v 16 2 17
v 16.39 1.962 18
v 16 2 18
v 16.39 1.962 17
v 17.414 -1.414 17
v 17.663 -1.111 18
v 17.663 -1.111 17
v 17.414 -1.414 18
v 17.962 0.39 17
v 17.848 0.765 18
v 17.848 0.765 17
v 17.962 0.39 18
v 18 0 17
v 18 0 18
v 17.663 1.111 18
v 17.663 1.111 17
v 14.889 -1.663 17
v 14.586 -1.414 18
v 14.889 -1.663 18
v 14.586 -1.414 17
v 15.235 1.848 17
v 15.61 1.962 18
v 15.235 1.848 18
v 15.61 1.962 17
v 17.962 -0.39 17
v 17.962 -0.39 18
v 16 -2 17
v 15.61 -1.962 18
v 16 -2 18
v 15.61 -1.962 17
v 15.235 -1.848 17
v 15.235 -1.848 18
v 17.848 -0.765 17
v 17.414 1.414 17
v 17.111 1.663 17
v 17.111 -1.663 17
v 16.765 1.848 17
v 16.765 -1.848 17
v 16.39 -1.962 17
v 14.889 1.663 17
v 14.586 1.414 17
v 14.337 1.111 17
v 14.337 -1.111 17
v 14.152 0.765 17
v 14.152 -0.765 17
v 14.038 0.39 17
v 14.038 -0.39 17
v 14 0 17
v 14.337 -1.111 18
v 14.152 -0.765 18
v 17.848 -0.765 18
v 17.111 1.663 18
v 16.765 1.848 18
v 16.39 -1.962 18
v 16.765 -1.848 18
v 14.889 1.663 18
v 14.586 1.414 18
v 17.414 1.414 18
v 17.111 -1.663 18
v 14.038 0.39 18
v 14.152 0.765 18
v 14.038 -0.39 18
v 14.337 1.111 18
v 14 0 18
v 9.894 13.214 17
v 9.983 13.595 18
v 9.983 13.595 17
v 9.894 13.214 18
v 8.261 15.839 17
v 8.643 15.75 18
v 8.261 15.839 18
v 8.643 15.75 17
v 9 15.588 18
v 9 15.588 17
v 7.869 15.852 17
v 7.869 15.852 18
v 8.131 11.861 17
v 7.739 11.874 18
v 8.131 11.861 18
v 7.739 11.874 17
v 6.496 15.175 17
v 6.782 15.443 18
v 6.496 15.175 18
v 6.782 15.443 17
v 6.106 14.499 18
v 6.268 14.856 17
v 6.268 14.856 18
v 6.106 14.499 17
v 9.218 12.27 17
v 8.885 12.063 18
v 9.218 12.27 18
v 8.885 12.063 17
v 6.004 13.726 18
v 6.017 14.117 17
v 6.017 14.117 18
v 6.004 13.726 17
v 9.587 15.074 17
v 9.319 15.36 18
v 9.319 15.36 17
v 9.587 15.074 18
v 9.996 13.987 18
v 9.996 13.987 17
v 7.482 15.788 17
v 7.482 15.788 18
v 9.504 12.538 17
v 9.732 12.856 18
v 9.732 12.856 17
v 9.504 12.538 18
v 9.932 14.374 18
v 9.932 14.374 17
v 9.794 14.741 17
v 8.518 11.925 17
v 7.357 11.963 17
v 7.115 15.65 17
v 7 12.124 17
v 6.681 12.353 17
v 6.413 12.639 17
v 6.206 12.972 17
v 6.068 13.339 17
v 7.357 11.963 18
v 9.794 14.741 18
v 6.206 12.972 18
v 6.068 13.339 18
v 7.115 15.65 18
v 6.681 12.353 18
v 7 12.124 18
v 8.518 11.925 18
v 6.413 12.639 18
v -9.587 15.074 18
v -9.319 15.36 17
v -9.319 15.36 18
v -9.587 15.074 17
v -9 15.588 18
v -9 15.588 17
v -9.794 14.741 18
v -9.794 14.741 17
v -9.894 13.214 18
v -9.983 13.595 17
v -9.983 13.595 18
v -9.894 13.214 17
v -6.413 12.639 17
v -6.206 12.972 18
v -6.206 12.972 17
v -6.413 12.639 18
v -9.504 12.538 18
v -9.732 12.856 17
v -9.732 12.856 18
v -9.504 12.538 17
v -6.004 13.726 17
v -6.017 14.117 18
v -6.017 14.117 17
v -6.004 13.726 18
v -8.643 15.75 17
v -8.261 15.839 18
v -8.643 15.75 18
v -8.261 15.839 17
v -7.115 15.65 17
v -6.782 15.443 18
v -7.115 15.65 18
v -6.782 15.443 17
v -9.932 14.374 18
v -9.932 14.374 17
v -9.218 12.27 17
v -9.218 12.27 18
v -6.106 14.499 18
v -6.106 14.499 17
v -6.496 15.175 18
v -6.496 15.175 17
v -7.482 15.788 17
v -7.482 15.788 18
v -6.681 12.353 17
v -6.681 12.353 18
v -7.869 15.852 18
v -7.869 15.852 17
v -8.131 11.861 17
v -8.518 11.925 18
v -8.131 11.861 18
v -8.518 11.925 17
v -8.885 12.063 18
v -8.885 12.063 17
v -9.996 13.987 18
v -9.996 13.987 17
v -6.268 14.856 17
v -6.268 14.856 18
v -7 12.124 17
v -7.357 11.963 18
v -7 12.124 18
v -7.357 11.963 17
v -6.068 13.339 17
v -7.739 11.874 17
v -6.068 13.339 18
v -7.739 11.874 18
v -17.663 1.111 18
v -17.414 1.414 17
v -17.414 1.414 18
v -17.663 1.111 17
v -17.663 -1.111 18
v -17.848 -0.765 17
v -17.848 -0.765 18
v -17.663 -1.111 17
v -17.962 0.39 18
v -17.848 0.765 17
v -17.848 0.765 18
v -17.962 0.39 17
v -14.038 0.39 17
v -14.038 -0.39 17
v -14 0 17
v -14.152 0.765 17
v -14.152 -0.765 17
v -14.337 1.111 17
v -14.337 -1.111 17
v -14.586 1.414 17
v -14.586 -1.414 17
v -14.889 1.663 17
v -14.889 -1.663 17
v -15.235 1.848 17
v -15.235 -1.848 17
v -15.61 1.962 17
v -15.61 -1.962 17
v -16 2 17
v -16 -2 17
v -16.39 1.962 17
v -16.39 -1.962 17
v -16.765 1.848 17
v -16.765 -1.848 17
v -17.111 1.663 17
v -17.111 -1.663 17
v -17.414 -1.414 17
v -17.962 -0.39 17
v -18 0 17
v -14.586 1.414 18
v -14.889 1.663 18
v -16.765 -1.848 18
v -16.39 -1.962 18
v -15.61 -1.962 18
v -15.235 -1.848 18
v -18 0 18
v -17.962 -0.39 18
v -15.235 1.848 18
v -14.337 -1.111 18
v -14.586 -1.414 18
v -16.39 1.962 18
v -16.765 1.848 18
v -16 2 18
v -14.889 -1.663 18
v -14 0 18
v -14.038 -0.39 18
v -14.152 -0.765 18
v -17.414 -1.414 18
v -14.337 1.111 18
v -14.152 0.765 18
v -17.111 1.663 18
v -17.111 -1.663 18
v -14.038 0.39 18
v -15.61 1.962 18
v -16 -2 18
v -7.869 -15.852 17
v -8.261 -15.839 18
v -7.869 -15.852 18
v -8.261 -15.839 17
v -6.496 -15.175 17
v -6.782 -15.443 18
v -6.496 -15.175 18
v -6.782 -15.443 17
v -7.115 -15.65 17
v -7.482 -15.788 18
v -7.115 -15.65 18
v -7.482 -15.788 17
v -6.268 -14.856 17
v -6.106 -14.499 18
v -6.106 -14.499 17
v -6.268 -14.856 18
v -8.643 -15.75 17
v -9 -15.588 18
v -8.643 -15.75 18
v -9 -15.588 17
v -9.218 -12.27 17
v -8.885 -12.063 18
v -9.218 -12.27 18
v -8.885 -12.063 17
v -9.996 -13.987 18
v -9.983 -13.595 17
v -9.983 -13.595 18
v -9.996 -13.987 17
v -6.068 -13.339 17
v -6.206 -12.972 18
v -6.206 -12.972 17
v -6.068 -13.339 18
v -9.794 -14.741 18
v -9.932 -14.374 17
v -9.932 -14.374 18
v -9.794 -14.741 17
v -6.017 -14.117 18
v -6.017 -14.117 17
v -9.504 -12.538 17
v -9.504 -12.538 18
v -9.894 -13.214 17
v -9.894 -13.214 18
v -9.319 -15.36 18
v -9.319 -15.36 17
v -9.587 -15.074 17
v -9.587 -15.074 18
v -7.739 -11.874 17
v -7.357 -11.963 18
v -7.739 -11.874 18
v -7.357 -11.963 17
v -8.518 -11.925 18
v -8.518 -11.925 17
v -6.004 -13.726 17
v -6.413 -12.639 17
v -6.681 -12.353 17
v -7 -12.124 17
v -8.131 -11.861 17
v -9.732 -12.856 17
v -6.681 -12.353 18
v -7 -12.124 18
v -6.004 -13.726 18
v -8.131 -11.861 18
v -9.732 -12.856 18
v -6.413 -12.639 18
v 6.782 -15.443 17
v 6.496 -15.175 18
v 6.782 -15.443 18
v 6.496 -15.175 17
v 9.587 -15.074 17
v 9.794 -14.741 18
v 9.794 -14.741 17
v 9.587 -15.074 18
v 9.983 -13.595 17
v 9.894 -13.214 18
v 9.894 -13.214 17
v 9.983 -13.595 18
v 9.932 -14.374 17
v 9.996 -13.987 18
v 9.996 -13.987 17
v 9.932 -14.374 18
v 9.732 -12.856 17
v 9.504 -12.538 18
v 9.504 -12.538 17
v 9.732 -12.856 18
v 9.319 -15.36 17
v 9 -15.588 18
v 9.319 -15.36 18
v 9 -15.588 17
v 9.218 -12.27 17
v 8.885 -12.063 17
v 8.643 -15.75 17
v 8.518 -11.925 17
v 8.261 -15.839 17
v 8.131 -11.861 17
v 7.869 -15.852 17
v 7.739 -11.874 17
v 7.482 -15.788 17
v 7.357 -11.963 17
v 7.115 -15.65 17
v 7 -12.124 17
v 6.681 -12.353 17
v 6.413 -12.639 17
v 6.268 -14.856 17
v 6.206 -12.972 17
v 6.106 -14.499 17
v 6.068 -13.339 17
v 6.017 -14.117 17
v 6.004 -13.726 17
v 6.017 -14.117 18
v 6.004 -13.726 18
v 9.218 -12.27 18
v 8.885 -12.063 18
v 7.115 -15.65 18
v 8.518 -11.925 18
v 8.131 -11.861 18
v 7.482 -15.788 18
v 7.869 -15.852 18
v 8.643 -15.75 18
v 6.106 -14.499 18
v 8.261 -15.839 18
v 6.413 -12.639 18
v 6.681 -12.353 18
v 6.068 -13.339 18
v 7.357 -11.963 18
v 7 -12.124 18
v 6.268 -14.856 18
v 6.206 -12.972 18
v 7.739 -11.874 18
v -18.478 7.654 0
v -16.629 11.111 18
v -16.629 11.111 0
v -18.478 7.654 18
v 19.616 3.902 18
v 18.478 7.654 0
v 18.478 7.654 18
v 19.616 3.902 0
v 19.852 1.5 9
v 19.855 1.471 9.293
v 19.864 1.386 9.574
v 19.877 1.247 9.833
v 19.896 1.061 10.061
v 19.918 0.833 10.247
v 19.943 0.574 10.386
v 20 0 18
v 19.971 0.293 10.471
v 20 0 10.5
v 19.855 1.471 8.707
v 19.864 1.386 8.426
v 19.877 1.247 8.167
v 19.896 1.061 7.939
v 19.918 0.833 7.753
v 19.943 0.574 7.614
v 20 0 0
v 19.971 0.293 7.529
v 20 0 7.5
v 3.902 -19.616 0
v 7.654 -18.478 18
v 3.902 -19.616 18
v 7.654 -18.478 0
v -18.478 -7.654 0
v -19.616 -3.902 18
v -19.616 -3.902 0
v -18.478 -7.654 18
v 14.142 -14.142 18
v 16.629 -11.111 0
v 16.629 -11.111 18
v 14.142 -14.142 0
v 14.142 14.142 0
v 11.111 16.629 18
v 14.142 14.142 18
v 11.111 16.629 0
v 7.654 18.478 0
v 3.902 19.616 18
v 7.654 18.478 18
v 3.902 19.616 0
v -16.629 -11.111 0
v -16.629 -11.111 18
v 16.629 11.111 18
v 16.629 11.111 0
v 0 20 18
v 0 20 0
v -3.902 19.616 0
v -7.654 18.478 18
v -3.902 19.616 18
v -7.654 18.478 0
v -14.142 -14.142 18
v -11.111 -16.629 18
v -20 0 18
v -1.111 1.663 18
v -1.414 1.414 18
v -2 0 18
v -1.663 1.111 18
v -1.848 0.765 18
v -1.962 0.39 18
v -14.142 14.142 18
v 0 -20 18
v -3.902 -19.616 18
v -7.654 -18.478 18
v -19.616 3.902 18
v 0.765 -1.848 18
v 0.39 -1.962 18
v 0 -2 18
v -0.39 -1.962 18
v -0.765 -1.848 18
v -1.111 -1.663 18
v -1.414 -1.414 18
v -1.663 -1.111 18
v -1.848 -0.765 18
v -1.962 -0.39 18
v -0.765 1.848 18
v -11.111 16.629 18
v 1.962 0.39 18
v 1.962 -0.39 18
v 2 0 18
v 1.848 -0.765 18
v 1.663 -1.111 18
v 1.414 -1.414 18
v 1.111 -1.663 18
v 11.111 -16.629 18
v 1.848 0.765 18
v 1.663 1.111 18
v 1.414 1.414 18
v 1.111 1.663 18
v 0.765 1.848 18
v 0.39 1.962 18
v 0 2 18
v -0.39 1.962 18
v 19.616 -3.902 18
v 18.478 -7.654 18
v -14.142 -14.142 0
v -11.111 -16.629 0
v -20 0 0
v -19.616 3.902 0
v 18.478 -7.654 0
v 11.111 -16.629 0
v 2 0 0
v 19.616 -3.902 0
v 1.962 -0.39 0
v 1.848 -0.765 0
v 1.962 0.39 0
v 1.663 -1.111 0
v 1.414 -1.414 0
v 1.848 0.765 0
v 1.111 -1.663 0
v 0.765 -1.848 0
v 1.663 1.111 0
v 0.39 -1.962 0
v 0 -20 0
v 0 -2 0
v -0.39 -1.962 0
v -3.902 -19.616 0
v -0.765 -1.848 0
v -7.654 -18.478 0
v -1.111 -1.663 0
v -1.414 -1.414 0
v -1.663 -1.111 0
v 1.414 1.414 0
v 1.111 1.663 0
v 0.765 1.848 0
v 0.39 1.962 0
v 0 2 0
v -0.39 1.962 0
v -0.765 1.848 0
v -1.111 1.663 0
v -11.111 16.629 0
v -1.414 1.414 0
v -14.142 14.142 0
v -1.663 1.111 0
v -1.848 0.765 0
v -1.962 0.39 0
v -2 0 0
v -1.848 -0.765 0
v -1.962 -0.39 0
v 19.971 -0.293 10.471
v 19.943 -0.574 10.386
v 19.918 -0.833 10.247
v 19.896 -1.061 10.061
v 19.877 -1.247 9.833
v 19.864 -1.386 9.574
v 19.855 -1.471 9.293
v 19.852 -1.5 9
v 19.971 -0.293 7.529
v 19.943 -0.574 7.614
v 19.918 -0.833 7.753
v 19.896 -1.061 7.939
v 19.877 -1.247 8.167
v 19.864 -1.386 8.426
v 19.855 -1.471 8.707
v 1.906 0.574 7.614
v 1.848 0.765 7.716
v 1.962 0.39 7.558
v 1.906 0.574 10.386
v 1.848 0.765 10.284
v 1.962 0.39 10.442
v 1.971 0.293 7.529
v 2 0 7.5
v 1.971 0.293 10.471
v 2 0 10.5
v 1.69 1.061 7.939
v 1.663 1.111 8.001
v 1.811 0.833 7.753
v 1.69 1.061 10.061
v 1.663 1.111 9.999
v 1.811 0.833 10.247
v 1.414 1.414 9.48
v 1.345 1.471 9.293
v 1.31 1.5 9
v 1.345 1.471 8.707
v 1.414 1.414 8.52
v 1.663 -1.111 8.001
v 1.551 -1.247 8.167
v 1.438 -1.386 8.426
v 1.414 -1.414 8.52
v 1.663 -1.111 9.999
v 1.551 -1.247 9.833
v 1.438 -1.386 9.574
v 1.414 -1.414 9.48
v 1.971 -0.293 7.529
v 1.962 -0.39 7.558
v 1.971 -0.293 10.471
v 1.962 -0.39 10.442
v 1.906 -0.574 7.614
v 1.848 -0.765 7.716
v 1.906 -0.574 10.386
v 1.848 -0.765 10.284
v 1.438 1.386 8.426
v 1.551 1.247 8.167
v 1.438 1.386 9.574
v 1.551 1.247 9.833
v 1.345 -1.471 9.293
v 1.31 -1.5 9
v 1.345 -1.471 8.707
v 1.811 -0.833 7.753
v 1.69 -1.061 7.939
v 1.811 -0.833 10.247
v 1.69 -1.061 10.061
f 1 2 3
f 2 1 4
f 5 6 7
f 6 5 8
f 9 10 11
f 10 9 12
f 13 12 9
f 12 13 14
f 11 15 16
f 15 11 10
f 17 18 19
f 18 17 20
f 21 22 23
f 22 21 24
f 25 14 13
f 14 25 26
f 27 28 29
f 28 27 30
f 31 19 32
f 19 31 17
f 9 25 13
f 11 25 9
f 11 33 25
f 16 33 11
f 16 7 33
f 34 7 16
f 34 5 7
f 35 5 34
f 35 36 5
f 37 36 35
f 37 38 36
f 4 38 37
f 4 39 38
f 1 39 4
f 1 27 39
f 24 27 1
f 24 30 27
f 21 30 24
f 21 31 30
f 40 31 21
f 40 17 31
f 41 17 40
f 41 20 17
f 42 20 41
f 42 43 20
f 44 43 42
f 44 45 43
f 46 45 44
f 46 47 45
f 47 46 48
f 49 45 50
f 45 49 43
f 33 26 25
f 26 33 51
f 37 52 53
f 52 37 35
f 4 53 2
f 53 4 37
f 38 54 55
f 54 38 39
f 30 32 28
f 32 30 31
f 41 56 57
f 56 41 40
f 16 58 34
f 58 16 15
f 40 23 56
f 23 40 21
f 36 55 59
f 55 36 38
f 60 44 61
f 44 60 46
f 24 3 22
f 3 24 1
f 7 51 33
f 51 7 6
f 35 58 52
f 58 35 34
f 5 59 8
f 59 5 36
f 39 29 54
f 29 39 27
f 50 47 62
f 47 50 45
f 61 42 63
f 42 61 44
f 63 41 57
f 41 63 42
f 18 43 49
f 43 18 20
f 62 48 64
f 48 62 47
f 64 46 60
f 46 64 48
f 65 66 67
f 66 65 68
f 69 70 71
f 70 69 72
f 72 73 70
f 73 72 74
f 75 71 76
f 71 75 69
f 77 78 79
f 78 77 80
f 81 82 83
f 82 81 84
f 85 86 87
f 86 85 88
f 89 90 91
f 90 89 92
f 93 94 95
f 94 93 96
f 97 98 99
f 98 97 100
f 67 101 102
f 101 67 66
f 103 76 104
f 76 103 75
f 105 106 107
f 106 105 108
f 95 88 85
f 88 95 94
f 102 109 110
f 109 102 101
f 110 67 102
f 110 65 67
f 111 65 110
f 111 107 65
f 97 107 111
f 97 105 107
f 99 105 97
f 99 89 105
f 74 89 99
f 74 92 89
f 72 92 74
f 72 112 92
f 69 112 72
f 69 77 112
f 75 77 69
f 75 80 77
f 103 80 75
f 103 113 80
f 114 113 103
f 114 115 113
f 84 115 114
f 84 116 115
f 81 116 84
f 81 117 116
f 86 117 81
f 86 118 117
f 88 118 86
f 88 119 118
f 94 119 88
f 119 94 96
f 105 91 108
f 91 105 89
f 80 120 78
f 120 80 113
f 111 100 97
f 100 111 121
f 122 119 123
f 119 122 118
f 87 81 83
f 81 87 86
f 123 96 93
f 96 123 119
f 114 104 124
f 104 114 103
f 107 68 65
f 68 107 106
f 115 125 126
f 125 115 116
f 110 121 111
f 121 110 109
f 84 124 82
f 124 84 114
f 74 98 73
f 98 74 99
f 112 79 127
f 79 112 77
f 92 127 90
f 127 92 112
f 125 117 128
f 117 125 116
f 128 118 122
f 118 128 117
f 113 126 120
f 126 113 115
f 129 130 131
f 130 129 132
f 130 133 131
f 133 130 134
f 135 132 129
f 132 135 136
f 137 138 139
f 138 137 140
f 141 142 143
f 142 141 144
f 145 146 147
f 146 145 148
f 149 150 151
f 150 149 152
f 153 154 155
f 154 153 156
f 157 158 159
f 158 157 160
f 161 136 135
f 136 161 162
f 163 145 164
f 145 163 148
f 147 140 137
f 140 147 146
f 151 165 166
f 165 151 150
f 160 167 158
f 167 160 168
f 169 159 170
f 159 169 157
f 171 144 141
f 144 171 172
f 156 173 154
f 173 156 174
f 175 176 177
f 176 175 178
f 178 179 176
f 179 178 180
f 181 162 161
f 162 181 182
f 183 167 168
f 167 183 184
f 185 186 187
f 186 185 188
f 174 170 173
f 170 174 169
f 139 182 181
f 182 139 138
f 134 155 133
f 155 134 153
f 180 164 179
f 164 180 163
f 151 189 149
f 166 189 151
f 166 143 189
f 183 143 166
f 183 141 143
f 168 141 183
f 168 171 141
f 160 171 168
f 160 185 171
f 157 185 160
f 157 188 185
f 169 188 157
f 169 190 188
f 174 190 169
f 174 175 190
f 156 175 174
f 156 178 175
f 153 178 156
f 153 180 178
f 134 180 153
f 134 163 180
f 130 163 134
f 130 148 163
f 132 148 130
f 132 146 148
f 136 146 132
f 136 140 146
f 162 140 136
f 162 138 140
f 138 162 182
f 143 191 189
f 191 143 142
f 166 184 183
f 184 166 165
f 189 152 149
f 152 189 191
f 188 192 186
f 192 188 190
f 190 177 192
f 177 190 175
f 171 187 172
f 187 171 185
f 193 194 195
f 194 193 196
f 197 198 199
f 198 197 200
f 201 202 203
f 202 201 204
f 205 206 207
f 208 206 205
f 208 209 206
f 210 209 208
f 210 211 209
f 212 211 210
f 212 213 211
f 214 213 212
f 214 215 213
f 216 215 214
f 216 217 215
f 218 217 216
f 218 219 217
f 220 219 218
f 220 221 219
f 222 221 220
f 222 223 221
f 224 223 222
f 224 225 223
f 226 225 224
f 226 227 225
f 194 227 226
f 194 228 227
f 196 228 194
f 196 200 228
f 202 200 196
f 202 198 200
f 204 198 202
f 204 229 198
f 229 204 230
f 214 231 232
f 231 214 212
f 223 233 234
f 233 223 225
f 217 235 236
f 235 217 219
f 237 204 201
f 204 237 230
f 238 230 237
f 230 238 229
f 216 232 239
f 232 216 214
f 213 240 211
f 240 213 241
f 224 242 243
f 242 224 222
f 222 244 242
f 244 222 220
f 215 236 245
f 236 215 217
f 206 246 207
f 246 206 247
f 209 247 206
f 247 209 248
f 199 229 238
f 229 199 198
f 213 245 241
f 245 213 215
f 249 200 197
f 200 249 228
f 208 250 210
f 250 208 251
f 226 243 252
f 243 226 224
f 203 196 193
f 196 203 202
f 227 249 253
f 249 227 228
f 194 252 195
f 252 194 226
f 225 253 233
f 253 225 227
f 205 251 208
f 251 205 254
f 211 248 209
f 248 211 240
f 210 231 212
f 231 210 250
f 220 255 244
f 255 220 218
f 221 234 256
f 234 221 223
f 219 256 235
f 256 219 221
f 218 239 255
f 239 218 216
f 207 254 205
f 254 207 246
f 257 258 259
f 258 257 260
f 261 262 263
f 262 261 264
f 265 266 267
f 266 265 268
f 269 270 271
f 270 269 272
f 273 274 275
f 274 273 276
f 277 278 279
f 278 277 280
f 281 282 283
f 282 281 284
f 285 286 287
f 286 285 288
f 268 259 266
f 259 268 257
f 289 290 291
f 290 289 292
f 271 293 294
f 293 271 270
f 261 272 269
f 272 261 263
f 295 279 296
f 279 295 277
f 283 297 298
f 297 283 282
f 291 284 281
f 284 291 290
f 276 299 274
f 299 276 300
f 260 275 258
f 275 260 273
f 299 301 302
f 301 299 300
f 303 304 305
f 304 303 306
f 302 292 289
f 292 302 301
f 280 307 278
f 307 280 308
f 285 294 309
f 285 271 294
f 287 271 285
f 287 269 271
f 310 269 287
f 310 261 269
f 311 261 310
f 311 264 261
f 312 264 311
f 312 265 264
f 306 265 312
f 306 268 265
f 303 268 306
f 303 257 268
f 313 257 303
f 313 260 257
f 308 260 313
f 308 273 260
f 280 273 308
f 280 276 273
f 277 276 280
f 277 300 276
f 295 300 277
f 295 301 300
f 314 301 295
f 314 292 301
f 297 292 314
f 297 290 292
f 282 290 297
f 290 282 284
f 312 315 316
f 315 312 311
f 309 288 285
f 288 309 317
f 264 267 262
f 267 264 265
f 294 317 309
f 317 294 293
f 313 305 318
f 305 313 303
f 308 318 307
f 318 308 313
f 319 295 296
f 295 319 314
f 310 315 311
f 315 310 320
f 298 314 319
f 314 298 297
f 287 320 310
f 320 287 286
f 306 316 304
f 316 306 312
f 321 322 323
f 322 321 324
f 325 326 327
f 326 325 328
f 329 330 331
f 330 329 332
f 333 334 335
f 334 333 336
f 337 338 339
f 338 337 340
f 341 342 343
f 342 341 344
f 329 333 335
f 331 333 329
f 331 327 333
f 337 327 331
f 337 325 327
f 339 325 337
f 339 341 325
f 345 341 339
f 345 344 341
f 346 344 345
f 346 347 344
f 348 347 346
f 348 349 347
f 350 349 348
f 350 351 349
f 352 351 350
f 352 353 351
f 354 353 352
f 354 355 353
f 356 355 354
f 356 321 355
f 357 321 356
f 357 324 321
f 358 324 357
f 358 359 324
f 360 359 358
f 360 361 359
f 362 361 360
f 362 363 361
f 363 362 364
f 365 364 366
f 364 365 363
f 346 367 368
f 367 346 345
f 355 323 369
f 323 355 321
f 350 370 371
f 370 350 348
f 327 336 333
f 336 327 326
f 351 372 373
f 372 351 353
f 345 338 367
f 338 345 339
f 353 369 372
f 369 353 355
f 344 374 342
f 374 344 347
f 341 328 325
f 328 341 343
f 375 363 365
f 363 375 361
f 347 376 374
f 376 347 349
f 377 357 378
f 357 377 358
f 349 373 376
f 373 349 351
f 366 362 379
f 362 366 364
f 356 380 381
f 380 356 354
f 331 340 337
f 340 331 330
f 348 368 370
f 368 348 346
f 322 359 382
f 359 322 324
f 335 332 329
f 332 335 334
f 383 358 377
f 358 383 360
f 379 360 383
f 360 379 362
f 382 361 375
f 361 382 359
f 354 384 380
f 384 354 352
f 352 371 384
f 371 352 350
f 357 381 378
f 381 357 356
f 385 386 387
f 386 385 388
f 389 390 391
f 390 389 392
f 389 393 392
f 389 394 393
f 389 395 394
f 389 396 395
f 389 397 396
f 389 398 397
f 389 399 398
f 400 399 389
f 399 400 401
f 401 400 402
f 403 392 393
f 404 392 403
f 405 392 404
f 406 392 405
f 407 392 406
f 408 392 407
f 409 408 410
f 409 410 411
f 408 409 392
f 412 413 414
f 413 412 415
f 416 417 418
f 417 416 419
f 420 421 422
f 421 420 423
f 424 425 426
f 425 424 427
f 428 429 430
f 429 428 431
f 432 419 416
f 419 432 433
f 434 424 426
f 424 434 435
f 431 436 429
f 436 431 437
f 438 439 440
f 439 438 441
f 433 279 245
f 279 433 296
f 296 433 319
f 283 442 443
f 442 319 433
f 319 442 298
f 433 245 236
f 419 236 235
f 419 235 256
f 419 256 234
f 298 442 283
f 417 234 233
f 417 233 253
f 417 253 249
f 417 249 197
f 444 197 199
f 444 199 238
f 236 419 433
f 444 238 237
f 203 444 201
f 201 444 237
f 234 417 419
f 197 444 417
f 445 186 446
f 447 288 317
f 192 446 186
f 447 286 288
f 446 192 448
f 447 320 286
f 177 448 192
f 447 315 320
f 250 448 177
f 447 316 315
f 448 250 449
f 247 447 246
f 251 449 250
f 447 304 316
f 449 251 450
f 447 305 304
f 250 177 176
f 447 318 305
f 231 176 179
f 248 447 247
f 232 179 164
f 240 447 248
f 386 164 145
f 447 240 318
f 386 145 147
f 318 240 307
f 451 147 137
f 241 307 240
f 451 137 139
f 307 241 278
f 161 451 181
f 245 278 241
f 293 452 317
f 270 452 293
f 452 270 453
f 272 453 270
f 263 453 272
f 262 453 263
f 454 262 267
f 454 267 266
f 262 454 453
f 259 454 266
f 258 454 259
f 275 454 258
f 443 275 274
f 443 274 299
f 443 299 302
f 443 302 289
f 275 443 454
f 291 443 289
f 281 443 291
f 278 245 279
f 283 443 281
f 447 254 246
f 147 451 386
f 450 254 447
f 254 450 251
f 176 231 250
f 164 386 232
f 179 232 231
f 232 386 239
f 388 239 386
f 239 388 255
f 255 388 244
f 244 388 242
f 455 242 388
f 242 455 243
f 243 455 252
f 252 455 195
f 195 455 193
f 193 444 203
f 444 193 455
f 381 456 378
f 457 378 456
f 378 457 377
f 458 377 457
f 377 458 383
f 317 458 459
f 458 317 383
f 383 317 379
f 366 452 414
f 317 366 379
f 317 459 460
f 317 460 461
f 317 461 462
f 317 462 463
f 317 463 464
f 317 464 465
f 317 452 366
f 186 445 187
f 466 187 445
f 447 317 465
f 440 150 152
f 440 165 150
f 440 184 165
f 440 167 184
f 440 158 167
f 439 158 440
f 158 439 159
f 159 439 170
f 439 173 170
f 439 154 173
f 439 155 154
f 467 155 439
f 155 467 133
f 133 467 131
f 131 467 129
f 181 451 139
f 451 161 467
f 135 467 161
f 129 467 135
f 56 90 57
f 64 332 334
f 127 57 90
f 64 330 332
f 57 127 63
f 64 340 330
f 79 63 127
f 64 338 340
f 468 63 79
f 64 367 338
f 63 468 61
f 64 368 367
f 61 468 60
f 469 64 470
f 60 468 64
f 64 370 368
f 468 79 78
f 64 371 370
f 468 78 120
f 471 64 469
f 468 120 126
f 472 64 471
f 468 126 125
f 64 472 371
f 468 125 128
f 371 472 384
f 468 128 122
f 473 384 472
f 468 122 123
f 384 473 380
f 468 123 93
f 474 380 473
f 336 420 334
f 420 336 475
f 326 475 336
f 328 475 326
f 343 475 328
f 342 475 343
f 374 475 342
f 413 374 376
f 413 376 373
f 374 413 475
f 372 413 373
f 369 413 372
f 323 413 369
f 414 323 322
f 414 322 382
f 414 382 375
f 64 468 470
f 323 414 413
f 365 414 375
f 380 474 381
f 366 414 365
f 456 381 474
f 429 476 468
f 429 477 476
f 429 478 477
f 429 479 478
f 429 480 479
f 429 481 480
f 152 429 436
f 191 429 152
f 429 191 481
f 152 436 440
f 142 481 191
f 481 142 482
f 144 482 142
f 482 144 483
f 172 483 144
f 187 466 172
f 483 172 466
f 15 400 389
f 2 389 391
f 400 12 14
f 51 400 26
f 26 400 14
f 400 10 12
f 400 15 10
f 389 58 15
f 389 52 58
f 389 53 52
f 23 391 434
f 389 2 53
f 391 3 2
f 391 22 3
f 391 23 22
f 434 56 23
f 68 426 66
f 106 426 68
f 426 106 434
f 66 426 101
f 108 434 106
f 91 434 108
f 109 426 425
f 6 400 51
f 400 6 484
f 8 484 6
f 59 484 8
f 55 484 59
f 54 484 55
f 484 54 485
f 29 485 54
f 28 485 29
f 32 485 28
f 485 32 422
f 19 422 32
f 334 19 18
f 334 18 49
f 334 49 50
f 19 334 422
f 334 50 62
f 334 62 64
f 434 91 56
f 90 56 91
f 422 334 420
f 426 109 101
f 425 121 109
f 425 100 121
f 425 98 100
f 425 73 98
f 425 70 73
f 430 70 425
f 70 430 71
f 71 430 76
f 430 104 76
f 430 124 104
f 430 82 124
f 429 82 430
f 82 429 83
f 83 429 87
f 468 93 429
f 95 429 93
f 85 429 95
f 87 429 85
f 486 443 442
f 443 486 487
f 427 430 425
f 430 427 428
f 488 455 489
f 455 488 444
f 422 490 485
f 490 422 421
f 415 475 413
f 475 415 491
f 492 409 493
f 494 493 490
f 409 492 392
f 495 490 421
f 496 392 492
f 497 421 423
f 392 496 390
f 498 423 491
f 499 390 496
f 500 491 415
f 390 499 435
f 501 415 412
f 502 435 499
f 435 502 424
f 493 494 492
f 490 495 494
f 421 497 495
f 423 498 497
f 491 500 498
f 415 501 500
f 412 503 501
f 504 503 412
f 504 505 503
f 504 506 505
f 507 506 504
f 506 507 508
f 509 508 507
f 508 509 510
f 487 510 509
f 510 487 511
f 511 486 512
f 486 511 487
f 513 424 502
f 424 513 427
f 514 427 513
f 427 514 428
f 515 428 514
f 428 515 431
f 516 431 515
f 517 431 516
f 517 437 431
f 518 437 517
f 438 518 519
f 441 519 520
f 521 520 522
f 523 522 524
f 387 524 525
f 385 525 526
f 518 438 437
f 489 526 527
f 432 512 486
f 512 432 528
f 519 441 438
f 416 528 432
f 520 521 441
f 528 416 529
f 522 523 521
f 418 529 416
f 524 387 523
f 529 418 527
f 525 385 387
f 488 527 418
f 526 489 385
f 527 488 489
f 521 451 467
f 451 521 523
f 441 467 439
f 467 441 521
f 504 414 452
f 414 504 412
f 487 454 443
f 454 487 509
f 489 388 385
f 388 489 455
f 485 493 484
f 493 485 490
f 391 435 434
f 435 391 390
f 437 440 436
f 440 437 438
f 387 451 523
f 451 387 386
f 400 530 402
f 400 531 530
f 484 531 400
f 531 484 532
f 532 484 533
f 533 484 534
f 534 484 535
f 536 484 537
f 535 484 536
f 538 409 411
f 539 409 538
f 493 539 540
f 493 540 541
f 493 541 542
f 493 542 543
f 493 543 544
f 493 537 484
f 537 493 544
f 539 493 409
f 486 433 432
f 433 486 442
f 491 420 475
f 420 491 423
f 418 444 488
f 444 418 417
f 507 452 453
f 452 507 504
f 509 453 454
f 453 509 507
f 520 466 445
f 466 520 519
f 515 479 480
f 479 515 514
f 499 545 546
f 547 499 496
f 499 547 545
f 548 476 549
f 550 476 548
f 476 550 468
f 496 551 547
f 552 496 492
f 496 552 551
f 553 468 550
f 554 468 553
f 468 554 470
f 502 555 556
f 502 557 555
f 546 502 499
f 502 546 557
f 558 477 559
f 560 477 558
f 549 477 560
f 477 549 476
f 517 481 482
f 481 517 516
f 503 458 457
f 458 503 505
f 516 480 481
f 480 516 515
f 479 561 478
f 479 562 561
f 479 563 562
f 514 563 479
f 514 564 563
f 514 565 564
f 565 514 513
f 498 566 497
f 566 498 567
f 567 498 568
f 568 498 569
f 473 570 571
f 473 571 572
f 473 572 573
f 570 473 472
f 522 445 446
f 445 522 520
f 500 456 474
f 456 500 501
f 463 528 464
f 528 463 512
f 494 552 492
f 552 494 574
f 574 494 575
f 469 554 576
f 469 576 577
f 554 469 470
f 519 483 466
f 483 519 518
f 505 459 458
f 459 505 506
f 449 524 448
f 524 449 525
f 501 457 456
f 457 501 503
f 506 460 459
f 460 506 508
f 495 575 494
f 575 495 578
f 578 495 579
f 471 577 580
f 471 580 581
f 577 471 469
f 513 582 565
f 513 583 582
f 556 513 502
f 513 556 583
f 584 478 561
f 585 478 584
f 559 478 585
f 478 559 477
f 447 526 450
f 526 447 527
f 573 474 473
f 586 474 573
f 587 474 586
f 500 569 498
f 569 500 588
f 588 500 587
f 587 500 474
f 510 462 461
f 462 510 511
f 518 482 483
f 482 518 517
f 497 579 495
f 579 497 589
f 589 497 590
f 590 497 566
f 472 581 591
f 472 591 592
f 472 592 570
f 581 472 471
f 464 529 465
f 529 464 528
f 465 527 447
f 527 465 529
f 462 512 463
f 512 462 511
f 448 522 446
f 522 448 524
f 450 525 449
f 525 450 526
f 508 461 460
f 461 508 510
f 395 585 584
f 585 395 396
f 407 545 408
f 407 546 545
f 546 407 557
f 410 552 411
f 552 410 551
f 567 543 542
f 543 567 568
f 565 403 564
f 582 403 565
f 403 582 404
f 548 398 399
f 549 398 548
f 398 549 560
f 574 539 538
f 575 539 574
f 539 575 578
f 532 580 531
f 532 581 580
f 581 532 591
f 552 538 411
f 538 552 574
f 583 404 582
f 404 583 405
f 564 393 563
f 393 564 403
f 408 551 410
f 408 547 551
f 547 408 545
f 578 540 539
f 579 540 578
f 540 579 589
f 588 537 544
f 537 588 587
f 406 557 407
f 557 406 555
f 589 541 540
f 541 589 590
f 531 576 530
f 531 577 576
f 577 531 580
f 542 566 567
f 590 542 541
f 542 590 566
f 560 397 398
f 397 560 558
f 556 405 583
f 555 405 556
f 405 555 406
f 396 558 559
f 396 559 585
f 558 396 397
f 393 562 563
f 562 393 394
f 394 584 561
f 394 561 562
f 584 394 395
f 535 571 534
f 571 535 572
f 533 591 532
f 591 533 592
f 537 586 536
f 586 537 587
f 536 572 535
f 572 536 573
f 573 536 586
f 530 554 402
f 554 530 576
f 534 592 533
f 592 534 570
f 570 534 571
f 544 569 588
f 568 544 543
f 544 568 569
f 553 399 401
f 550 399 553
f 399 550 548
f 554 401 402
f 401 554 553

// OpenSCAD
$fn = 32;

// ----------------------------------------------------------------------
// Control knob: dimpled knob
// ----------------------------------------------------------------------

// --- parameters (mm) ---
dimp_d = 4;               // finger dimple diameter
n_dimp = 6;               // number of dimples
dimp_r = 16;              // dimple ring radius
knob_d = 40;              // knob body diameter
knob_h = 18;              // knob body height
bore_d = 4;               // shaft bore diameter
set_d = 3;                // set screw bore diameter
fit_tol = 0.05;           // tolerance for press fits, mm
free_tol = 0.2;           // tolerance for clearance fits, mm

dimp_step = 360 / n_dimp;  // dimple angular step

difference() {
  cylinder(h = knob_h, d = knob_d);
  translate([0, 0, -1]) cylinder(h = knob_h + 2, d = bore_d);
  translate([-1, 0, knob_h / 2]) rotate([0, 90, 0])
    cylinder(h = knob_d / 2 + bore_d / 2 + 2, d = set_d);  for (i = [0 : n_dimp - 1])
    rotate([0, 0, i * dimp_step])
      translate([dimp_r, 0, knob_h - 1])
        cylinder(h = 2, d = dimp_d);
}
